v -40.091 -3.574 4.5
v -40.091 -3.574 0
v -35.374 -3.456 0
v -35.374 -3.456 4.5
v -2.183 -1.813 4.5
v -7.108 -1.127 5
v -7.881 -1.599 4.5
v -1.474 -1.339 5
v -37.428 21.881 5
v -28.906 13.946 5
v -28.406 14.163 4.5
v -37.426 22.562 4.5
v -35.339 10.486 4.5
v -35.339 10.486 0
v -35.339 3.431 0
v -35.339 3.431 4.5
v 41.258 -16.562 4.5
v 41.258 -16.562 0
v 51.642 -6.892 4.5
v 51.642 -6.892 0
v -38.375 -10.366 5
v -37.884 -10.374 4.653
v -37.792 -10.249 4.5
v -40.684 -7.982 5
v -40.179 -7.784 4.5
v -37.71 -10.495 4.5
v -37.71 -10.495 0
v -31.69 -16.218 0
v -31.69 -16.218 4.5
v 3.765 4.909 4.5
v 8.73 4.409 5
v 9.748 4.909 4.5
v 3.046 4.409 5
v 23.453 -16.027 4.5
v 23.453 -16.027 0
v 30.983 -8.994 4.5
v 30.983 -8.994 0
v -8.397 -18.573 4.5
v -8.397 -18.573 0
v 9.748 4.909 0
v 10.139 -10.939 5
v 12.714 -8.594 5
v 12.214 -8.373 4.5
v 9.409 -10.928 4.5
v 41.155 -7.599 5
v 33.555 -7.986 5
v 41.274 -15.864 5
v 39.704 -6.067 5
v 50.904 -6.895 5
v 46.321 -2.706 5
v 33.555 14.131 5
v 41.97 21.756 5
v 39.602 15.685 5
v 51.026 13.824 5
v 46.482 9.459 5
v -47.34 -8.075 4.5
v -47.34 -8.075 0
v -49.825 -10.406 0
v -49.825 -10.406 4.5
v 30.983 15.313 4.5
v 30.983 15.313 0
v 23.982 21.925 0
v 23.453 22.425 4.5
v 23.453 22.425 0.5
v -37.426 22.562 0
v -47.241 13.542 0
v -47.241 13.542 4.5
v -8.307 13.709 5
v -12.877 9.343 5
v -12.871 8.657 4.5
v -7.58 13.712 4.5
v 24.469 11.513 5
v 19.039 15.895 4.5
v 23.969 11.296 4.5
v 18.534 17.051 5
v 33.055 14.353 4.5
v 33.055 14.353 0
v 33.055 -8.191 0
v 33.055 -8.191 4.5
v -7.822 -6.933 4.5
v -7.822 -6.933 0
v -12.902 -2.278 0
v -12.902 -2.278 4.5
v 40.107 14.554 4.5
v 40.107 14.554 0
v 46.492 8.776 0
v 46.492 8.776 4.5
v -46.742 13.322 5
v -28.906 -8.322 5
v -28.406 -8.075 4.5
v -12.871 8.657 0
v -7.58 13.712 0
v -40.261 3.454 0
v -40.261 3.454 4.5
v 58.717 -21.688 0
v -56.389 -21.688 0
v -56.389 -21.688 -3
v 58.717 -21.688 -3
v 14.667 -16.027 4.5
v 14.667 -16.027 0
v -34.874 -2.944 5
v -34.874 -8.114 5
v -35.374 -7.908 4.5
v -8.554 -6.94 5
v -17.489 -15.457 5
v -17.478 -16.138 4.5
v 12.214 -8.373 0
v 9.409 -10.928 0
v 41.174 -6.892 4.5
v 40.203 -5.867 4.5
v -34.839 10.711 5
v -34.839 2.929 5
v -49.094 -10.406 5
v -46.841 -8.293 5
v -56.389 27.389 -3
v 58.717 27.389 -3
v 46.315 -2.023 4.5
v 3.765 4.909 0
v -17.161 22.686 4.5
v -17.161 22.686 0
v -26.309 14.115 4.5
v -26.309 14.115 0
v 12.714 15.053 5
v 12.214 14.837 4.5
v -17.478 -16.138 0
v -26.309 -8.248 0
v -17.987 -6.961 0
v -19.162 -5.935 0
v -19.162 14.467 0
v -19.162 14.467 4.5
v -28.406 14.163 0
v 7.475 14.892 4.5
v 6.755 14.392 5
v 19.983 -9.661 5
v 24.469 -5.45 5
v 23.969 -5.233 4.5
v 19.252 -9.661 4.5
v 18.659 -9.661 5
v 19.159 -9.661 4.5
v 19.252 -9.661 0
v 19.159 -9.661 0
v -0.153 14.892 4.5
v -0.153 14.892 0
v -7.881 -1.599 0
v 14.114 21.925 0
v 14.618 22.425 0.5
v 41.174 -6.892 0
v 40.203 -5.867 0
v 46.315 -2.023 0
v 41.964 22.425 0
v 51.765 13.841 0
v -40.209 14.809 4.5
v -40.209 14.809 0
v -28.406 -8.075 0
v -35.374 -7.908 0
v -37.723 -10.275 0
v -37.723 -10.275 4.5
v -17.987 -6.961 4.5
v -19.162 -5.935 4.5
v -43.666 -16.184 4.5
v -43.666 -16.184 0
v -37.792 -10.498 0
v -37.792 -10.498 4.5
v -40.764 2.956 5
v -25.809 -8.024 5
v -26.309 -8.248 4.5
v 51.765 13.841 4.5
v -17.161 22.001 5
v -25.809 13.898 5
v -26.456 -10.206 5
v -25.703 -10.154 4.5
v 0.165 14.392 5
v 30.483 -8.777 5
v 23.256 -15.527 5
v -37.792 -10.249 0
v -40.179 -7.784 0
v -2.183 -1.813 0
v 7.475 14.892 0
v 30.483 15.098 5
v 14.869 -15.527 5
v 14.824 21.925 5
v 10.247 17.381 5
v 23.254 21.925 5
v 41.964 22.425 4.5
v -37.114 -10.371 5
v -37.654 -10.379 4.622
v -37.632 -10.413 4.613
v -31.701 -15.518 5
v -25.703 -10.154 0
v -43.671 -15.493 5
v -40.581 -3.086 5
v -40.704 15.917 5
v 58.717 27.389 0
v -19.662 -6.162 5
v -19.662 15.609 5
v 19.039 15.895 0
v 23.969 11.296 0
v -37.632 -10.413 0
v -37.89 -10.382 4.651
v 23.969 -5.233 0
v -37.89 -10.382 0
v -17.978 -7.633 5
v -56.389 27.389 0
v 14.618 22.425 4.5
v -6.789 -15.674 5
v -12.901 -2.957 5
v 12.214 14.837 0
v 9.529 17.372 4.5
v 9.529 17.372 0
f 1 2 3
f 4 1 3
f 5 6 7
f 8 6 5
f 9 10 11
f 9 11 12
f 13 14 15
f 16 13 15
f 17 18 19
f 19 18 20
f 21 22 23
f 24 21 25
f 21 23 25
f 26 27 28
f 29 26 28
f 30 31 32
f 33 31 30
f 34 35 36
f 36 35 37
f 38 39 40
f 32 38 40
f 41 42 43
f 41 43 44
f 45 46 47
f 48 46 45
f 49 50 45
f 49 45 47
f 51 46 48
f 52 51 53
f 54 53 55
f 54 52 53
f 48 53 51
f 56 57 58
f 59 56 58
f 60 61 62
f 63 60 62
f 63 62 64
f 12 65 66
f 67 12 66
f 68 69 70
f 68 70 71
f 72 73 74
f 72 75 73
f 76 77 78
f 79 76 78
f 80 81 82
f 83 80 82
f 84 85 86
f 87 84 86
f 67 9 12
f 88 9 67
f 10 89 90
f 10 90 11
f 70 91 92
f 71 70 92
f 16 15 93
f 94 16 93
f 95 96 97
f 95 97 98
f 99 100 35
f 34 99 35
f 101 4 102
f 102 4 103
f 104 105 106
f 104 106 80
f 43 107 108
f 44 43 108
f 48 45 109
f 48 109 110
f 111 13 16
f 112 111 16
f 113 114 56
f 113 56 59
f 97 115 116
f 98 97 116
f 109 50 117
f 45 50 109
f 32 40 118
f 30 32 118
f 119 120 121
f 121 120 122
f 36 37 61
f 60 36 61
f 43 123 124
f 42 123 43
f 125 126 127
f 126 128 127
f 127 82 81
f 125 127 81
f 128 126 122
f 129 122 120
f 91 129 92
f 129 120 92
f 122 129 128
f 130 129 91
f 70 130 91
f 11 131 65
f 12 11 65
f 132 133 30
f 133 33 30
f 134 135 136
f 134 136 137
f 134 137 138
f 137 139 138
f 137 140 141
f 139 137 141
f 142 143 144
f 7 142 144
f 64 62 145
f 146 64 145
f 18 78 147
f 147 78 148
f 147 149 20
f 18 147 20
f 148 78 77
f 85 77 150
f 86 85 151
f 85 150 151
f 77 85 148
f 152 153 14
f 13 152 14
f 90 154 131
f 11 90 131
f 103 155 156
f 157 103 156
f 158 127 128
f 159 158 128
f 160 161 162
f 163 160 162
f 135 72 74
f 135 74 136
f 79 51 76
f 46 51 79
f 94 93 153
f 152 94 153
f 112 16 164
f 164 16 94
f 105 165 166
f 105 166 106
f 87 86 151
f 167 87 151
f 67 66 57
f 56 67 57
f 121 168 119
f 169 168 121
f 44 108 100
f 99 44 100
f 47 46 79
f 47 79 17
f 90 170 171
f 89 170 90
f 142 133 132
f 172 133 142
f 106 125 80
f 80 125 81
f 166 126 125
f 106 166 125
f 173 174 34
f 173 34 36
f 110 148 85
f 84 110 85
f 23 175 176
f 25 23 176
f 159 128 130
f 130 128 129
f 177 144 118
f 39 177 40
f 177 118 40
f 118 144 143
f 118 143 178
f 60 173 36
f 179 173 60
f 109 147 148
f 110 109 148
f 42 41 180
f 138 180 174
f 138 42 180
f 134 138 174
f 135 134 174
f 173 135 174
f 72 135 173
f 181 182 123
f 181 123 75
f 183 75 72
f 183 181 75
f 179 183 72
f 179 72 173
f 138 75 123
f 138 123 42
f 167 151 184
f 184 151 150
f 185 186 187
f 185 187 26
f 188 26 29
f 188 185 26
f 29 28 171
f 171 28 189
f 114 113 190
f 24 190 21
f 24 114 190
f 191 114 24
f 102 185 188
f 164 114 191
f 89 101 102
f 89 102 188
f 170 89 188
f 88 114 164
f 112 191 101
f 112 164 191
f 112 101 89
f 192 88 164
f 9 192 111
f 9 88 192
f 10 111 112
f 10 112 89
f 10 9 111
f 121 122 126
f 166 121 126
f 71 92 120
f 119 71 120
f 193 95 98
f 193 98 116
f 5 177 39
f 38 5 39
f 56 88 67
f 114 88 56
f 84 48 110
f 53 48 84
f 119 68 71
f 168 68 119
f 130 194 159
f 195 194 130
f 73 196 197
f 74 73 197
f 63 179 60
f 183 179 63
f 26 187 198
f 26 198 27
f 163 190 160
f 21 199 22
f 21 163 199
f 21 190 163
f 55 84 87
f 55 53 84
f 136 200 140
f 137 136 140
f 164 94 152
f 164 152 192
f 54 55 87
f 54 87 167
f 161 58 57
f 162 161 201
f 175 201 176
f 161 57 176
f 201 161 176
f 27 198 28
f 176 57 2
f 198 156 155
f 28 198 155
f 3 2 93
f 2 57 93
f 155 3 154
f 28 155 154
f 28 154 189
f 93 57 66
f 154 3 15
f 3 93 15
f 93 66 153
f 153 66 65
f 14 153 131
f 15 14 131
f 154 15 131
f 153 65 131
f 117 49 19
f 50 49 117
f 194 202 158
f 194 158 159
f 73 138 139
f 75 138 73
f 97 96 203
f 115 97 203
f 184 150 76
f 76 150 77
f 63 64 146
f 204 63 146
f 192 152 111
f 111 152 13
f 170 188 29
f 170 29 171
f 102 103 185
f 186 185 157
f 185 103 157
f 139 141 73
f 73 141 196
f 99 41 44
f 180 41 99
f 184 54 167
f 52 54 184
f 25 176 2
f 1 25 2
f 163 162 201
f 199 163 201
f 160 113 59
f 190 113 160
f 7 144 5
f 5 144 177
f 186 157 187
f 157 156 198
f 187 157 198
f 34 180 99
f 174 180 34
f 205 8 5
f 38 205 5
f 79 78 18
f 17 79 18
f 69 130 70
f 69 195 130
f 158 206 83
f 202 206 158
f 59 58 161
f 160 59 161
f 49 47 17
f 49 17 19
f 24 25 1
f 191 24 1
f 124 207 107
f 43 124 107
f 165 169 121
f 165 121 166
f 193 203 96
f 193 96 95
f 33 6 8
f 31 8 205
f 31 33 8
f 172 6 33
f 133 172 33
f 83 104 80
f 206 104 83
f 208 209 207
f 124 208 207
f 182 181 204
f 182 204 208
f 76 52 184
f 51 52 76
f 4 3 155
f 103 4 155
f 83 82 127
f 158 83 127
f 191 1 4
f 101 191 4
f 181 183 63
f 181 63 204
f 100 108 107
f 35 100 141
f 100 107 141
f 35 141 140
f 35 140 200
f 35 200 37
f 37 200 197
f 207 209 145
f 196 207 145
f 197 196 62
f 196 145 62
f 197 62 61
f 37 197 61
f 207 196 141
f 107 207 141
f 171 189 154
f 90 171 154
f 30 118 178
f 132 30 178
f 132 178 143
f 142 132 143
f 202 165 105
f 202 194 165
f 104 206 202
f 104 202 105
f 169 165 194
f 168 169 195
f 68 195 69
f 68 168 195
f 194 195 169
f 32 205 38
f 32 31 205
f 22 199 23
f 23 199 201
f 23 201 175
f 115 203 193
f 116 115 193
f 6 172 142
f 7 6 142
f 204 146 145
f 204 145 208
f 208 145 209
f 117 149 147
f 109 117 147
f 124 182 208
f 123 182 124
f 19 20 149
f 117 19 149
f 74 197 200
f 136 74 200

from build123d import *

# Parameters (mm, degrees)
F1_DEPTH  = 5
F2_SIZE   = 0.5
F3_SIZE   = 0.5
F4_SIZE   = 0.5
F4_2_SIZE = 0.5
F4_3_SIZE = 0.5
F5_W      = 115.1058450341
F5_H      = 49.0769091994
F6_DEPTH  = 3


with BuildPart() as f1:
    # F0 (on Top) → F1 (new body)
    with BuildSketch(Plane.XY):
        Polygon((-37.42608428, 22.5619599223), (-47.2409762442, 13.5421995074), (-47.3403669894, -8.0754114315), (-49.8249195516, -10.4061011225), (-43.6656922102, -16.1837078631), (-37.7921573818, -10.4982452467), (-37.8895290196, -10.3818755597), (-37.7921573818, -10.2489022538), (-40.1794202626, -7.7844434418), (-40.0907732546, -3.5736807622), (-35.3744700551, -3.4561404003), (-35.3744700551, -7.9084793106), (-37.7229635754, -10.2751602206), (-37.6319399832, -10.4127417504), (-37.7099849284, -10.4948300868), (-31.6901914775, -16.2181090564), (-25.7026143372, -10.1542454213), (-28.4063257277, -8.0754114315), (-28.4063257277, 14.1633953899), align=None)
        Polygon((-40.2612486885, 3.4539912895), (-40.2090400457, 14.8094361648), (-35.3391999321, 10.4859145358), (-35.3391999321, 3.43136131), align=None, mode=Mode.SUBTRACT)
    extrude(amount=F1_DEPTH)

    # F3 (call 1 of 3: OpenCascade refuses the feature's edges together)
    f3_edges = [f1.edges().sort_by_distance(p)[0] for p in [
        (-42.33353, 18.05208, 5),
        (-32.916205, 18.362678, 5),
        (-28.406326, 3.043992, 5),
        (-27.05447, -9.114828, 5),
        (-28.696403, -13.186177, 5),
        (-34.700088, -13.35647, 5),
        (-47.290672, 2.733394, 5),
        (-48.582643, -9.240756, 5),
        (-46.745306, -13.294904, 5),
        (-40.728925, -13.340977, 5),
    ]]
    chamfer(f3_edges, length=F3_SIZE)

    # F3#2 (call 2 of 3)
    f3_2_edges = [f1.edges().sort_by_distance(p)[0] for p in [
        (-38.985789, -9.016673, 5),
        (-40.135097, -5.679062, 5),
        (-37.732622, -3.514911, 5),
        (-35.37447, -5.68231, 5),
        (-36.548717, -9.09182, 5),
    ]]
    chamfer(f3_2_edges, length=F3_SIZE)

    # F3#3 (call 3 of 3)
    f3_3_edges = [f1.edges().sort_by_distance(p)[0] for p in [
        (-35.3392, 6.958638, 5),
        (-37.77412, 12.647675, 5),
        (-40.235144, 9.131714, 5),
        (-37.800224, 3.442676, 5),
    ]]
    chamfer(f3_3_edges, length=F3_SIZE)


with BuildPart() as f1b:
    # F0 (on Top) → F1, piece 2 (new body)
    with BuildSketch(Plane.XY):
        Polygon((-19.161703065, 14.4670484588), (-12.8708295524, 8.6571360007), (-7.5798099861, 13.7121323496), (-17.1608086675, 22.685950622), (-26.3091549277, 14.1149796546), (-26.3091549277, -8.2478513941), (-17.4777526408, -16.1375980824), (-7.8215589747, -6.9329035468), (-12.9021368921, -2.2783528548), (-17.9871674627, -6.9614294916), (-19.161703065, -5.9346454218), align=None)
    extrude(amount=F1_DEPTH)

    # F2
    f2_edges = [f1b.edges().sort_by_distance(p)[0] for p in [
        (-21.734982, 18.400465, 5),
        (-12.370309, 18.199041, 5),
        (-10.22532, 11.184634, 5),
        (-16.016266, 11.562092, 5),
        (-19.161703, 4.266202, 5),
        (-18.574435, -6.448037, 5),
        (-15.444652, -4.619891, 5),
        (-10.361848, -4.605628, 5),
        (-12.649656, -11.535251, 5),
        (-21.893454, -12.192725, 5),
        (-26.309155, 2.933564, 5),
    ]]
    chamfer(f2_edges, length=F2_SIZE)


with BuildPart() as f1c:
    # F0 (on Top) → F1, piece 3 (new body)
    with BuildSketch(Plane.XY):
        Polygon((3.7653737236, 4.9088806845), (7.4746427126, 14.8920789361), (-0.1533375762, 14.8920789361), (-7.8814821318, -1.59857166), (-2.1826399025, -1.8131509423), (-8.3971247077, -18.5731500387), (9.7478628159, 4.9088806845), align=None)
    extrude(amount=F1_DEPTH)

    # F4
    f4_edges = [f1c.edges().sort_by_distance(p)[0] for p in [
        (-4.01741, 6.646754, 5),
        (6.756618, 4.908881, 5),
        (0.675369, -6.832135, 5),
        (-5.289882, -10.19315, 5),
        (-5.032061, -1.705861, 5),
        (5.620008, 9.90048, 5),
        (3.660653, 14.892079, 5),
    ]]
    chamfer(f4_edges, length=F4_SIZE)


with BuildPart() as f1d:
    # F0 (on Top) → F1, piece 4 (new body)
    with BuildSketch(Plane.XY):
        Polygon((23.4530437738, 22.4253199995), (14.6175920963, 22.4253199995), (9.5286192372, 17.3721760511), (12.2141102329, 14.837116003), (12.2141102329, -8.37269146), (9.409093298, -10.9280645847), (14.6665340289, -16.0265769809), (23.4530437738, -16.0265769809), (30.9827085584, -8.9936666191), (30.9827085584, 15.3131149709), align=None)
        Polygon((19.1591493785, -9.66059044), (19.0391037613, 15.8954672515), (23.9688307047, 11.2960087135), (23.9688307047, -5.2332254127), (19.2519631237, -9.66059044), align=None, mode=Mode.SUBTRACT)
    extrude(amount=F1_DEPTH)

    # F4#2
    f4_2_edges = [f1d.edges().sort_by_distance(p)[0] for p in [
        (12.21411, 3.232212, 5),
        (10.871365, 16.104646, 5),
        (12.073106, 19.898748, 5),
        (19.035318, 22.42532, 0),
        (27.217876, 18.869217, 5),
        (30.982709, 3.159724, 5),
        (27.217876, -12.510122, 5),
        (19.059789, -16.026577, 5),
        (12.037814, -13.477321, 5),
        (19.099127, 3.117438, 5),
        (21.610397, -7.446908, 5),
        (23.968831, 3.031392, 5),
        (21.503967, 13.595738, 5),
        (19.035318, 22.42532, 5),
        (10.811602, -9.650378, 5),
    ]]
    chamfer(f4_2_edges, length=F4_2_SIZE)


with BuildPart() as f1e:
    # F0 (on Top) → F1, piece 5 (new body)
    with BuildSketch(Plane.XY):
        Polygon((46.4923679829, 8.7755601853), (51.76525563, 13.841053471), (41.9640727341, 22.4253199995), (33.0546163023, 14.3528934568), (33.0546163023, -8.1906411797), (41.2580221891, -16.5618509054), (51.6416355968, -6.891772151), (46.3153868914, -2.0229439251), (41.1742553115, -6.891772151), (40.203319401, -5.8665338308), (40.1073985943, 14.55368414), align=None)
    extrude(amount=F1_DEPTH)

    # F4#3
    f4_3_edges = [f1e.edges().sort_by_distance(p)[0] for p in [
        (33.054616, 3.081126, 5),
        (37.509345, 18.389107, 5),
        (46.864664, 18.133187, 5),
        (49.128812, 11.308307, 5),
        (43.299883, 11.664622, 5),
        (40.155359, 4.343575, 5),
        (40.688787, -6.379153, 5),
        (43.744821, -4.457358, 5),
        (48.978511, -4.457358, 5),
        (46.449829, -11.726812, 5),
        (37.156319, -12.376246, 5),
    ]]
    chamfer(f4_3_edges, length=F4_3_SIZE)


with BuildPart() as f6:
    # F5 (on Top) → F6 (new body)
    with BuildSketch(Plane.XY):
        with Locations((1.1639595032, 2.8500640765)):
            Rectangle(F5_W, F5_H)
    extrude(amount=-F6_DEPTH)


solid = Compound([f1.part, f1b.part, f1c.part, f1d.part, f1e.part, f6.part])
